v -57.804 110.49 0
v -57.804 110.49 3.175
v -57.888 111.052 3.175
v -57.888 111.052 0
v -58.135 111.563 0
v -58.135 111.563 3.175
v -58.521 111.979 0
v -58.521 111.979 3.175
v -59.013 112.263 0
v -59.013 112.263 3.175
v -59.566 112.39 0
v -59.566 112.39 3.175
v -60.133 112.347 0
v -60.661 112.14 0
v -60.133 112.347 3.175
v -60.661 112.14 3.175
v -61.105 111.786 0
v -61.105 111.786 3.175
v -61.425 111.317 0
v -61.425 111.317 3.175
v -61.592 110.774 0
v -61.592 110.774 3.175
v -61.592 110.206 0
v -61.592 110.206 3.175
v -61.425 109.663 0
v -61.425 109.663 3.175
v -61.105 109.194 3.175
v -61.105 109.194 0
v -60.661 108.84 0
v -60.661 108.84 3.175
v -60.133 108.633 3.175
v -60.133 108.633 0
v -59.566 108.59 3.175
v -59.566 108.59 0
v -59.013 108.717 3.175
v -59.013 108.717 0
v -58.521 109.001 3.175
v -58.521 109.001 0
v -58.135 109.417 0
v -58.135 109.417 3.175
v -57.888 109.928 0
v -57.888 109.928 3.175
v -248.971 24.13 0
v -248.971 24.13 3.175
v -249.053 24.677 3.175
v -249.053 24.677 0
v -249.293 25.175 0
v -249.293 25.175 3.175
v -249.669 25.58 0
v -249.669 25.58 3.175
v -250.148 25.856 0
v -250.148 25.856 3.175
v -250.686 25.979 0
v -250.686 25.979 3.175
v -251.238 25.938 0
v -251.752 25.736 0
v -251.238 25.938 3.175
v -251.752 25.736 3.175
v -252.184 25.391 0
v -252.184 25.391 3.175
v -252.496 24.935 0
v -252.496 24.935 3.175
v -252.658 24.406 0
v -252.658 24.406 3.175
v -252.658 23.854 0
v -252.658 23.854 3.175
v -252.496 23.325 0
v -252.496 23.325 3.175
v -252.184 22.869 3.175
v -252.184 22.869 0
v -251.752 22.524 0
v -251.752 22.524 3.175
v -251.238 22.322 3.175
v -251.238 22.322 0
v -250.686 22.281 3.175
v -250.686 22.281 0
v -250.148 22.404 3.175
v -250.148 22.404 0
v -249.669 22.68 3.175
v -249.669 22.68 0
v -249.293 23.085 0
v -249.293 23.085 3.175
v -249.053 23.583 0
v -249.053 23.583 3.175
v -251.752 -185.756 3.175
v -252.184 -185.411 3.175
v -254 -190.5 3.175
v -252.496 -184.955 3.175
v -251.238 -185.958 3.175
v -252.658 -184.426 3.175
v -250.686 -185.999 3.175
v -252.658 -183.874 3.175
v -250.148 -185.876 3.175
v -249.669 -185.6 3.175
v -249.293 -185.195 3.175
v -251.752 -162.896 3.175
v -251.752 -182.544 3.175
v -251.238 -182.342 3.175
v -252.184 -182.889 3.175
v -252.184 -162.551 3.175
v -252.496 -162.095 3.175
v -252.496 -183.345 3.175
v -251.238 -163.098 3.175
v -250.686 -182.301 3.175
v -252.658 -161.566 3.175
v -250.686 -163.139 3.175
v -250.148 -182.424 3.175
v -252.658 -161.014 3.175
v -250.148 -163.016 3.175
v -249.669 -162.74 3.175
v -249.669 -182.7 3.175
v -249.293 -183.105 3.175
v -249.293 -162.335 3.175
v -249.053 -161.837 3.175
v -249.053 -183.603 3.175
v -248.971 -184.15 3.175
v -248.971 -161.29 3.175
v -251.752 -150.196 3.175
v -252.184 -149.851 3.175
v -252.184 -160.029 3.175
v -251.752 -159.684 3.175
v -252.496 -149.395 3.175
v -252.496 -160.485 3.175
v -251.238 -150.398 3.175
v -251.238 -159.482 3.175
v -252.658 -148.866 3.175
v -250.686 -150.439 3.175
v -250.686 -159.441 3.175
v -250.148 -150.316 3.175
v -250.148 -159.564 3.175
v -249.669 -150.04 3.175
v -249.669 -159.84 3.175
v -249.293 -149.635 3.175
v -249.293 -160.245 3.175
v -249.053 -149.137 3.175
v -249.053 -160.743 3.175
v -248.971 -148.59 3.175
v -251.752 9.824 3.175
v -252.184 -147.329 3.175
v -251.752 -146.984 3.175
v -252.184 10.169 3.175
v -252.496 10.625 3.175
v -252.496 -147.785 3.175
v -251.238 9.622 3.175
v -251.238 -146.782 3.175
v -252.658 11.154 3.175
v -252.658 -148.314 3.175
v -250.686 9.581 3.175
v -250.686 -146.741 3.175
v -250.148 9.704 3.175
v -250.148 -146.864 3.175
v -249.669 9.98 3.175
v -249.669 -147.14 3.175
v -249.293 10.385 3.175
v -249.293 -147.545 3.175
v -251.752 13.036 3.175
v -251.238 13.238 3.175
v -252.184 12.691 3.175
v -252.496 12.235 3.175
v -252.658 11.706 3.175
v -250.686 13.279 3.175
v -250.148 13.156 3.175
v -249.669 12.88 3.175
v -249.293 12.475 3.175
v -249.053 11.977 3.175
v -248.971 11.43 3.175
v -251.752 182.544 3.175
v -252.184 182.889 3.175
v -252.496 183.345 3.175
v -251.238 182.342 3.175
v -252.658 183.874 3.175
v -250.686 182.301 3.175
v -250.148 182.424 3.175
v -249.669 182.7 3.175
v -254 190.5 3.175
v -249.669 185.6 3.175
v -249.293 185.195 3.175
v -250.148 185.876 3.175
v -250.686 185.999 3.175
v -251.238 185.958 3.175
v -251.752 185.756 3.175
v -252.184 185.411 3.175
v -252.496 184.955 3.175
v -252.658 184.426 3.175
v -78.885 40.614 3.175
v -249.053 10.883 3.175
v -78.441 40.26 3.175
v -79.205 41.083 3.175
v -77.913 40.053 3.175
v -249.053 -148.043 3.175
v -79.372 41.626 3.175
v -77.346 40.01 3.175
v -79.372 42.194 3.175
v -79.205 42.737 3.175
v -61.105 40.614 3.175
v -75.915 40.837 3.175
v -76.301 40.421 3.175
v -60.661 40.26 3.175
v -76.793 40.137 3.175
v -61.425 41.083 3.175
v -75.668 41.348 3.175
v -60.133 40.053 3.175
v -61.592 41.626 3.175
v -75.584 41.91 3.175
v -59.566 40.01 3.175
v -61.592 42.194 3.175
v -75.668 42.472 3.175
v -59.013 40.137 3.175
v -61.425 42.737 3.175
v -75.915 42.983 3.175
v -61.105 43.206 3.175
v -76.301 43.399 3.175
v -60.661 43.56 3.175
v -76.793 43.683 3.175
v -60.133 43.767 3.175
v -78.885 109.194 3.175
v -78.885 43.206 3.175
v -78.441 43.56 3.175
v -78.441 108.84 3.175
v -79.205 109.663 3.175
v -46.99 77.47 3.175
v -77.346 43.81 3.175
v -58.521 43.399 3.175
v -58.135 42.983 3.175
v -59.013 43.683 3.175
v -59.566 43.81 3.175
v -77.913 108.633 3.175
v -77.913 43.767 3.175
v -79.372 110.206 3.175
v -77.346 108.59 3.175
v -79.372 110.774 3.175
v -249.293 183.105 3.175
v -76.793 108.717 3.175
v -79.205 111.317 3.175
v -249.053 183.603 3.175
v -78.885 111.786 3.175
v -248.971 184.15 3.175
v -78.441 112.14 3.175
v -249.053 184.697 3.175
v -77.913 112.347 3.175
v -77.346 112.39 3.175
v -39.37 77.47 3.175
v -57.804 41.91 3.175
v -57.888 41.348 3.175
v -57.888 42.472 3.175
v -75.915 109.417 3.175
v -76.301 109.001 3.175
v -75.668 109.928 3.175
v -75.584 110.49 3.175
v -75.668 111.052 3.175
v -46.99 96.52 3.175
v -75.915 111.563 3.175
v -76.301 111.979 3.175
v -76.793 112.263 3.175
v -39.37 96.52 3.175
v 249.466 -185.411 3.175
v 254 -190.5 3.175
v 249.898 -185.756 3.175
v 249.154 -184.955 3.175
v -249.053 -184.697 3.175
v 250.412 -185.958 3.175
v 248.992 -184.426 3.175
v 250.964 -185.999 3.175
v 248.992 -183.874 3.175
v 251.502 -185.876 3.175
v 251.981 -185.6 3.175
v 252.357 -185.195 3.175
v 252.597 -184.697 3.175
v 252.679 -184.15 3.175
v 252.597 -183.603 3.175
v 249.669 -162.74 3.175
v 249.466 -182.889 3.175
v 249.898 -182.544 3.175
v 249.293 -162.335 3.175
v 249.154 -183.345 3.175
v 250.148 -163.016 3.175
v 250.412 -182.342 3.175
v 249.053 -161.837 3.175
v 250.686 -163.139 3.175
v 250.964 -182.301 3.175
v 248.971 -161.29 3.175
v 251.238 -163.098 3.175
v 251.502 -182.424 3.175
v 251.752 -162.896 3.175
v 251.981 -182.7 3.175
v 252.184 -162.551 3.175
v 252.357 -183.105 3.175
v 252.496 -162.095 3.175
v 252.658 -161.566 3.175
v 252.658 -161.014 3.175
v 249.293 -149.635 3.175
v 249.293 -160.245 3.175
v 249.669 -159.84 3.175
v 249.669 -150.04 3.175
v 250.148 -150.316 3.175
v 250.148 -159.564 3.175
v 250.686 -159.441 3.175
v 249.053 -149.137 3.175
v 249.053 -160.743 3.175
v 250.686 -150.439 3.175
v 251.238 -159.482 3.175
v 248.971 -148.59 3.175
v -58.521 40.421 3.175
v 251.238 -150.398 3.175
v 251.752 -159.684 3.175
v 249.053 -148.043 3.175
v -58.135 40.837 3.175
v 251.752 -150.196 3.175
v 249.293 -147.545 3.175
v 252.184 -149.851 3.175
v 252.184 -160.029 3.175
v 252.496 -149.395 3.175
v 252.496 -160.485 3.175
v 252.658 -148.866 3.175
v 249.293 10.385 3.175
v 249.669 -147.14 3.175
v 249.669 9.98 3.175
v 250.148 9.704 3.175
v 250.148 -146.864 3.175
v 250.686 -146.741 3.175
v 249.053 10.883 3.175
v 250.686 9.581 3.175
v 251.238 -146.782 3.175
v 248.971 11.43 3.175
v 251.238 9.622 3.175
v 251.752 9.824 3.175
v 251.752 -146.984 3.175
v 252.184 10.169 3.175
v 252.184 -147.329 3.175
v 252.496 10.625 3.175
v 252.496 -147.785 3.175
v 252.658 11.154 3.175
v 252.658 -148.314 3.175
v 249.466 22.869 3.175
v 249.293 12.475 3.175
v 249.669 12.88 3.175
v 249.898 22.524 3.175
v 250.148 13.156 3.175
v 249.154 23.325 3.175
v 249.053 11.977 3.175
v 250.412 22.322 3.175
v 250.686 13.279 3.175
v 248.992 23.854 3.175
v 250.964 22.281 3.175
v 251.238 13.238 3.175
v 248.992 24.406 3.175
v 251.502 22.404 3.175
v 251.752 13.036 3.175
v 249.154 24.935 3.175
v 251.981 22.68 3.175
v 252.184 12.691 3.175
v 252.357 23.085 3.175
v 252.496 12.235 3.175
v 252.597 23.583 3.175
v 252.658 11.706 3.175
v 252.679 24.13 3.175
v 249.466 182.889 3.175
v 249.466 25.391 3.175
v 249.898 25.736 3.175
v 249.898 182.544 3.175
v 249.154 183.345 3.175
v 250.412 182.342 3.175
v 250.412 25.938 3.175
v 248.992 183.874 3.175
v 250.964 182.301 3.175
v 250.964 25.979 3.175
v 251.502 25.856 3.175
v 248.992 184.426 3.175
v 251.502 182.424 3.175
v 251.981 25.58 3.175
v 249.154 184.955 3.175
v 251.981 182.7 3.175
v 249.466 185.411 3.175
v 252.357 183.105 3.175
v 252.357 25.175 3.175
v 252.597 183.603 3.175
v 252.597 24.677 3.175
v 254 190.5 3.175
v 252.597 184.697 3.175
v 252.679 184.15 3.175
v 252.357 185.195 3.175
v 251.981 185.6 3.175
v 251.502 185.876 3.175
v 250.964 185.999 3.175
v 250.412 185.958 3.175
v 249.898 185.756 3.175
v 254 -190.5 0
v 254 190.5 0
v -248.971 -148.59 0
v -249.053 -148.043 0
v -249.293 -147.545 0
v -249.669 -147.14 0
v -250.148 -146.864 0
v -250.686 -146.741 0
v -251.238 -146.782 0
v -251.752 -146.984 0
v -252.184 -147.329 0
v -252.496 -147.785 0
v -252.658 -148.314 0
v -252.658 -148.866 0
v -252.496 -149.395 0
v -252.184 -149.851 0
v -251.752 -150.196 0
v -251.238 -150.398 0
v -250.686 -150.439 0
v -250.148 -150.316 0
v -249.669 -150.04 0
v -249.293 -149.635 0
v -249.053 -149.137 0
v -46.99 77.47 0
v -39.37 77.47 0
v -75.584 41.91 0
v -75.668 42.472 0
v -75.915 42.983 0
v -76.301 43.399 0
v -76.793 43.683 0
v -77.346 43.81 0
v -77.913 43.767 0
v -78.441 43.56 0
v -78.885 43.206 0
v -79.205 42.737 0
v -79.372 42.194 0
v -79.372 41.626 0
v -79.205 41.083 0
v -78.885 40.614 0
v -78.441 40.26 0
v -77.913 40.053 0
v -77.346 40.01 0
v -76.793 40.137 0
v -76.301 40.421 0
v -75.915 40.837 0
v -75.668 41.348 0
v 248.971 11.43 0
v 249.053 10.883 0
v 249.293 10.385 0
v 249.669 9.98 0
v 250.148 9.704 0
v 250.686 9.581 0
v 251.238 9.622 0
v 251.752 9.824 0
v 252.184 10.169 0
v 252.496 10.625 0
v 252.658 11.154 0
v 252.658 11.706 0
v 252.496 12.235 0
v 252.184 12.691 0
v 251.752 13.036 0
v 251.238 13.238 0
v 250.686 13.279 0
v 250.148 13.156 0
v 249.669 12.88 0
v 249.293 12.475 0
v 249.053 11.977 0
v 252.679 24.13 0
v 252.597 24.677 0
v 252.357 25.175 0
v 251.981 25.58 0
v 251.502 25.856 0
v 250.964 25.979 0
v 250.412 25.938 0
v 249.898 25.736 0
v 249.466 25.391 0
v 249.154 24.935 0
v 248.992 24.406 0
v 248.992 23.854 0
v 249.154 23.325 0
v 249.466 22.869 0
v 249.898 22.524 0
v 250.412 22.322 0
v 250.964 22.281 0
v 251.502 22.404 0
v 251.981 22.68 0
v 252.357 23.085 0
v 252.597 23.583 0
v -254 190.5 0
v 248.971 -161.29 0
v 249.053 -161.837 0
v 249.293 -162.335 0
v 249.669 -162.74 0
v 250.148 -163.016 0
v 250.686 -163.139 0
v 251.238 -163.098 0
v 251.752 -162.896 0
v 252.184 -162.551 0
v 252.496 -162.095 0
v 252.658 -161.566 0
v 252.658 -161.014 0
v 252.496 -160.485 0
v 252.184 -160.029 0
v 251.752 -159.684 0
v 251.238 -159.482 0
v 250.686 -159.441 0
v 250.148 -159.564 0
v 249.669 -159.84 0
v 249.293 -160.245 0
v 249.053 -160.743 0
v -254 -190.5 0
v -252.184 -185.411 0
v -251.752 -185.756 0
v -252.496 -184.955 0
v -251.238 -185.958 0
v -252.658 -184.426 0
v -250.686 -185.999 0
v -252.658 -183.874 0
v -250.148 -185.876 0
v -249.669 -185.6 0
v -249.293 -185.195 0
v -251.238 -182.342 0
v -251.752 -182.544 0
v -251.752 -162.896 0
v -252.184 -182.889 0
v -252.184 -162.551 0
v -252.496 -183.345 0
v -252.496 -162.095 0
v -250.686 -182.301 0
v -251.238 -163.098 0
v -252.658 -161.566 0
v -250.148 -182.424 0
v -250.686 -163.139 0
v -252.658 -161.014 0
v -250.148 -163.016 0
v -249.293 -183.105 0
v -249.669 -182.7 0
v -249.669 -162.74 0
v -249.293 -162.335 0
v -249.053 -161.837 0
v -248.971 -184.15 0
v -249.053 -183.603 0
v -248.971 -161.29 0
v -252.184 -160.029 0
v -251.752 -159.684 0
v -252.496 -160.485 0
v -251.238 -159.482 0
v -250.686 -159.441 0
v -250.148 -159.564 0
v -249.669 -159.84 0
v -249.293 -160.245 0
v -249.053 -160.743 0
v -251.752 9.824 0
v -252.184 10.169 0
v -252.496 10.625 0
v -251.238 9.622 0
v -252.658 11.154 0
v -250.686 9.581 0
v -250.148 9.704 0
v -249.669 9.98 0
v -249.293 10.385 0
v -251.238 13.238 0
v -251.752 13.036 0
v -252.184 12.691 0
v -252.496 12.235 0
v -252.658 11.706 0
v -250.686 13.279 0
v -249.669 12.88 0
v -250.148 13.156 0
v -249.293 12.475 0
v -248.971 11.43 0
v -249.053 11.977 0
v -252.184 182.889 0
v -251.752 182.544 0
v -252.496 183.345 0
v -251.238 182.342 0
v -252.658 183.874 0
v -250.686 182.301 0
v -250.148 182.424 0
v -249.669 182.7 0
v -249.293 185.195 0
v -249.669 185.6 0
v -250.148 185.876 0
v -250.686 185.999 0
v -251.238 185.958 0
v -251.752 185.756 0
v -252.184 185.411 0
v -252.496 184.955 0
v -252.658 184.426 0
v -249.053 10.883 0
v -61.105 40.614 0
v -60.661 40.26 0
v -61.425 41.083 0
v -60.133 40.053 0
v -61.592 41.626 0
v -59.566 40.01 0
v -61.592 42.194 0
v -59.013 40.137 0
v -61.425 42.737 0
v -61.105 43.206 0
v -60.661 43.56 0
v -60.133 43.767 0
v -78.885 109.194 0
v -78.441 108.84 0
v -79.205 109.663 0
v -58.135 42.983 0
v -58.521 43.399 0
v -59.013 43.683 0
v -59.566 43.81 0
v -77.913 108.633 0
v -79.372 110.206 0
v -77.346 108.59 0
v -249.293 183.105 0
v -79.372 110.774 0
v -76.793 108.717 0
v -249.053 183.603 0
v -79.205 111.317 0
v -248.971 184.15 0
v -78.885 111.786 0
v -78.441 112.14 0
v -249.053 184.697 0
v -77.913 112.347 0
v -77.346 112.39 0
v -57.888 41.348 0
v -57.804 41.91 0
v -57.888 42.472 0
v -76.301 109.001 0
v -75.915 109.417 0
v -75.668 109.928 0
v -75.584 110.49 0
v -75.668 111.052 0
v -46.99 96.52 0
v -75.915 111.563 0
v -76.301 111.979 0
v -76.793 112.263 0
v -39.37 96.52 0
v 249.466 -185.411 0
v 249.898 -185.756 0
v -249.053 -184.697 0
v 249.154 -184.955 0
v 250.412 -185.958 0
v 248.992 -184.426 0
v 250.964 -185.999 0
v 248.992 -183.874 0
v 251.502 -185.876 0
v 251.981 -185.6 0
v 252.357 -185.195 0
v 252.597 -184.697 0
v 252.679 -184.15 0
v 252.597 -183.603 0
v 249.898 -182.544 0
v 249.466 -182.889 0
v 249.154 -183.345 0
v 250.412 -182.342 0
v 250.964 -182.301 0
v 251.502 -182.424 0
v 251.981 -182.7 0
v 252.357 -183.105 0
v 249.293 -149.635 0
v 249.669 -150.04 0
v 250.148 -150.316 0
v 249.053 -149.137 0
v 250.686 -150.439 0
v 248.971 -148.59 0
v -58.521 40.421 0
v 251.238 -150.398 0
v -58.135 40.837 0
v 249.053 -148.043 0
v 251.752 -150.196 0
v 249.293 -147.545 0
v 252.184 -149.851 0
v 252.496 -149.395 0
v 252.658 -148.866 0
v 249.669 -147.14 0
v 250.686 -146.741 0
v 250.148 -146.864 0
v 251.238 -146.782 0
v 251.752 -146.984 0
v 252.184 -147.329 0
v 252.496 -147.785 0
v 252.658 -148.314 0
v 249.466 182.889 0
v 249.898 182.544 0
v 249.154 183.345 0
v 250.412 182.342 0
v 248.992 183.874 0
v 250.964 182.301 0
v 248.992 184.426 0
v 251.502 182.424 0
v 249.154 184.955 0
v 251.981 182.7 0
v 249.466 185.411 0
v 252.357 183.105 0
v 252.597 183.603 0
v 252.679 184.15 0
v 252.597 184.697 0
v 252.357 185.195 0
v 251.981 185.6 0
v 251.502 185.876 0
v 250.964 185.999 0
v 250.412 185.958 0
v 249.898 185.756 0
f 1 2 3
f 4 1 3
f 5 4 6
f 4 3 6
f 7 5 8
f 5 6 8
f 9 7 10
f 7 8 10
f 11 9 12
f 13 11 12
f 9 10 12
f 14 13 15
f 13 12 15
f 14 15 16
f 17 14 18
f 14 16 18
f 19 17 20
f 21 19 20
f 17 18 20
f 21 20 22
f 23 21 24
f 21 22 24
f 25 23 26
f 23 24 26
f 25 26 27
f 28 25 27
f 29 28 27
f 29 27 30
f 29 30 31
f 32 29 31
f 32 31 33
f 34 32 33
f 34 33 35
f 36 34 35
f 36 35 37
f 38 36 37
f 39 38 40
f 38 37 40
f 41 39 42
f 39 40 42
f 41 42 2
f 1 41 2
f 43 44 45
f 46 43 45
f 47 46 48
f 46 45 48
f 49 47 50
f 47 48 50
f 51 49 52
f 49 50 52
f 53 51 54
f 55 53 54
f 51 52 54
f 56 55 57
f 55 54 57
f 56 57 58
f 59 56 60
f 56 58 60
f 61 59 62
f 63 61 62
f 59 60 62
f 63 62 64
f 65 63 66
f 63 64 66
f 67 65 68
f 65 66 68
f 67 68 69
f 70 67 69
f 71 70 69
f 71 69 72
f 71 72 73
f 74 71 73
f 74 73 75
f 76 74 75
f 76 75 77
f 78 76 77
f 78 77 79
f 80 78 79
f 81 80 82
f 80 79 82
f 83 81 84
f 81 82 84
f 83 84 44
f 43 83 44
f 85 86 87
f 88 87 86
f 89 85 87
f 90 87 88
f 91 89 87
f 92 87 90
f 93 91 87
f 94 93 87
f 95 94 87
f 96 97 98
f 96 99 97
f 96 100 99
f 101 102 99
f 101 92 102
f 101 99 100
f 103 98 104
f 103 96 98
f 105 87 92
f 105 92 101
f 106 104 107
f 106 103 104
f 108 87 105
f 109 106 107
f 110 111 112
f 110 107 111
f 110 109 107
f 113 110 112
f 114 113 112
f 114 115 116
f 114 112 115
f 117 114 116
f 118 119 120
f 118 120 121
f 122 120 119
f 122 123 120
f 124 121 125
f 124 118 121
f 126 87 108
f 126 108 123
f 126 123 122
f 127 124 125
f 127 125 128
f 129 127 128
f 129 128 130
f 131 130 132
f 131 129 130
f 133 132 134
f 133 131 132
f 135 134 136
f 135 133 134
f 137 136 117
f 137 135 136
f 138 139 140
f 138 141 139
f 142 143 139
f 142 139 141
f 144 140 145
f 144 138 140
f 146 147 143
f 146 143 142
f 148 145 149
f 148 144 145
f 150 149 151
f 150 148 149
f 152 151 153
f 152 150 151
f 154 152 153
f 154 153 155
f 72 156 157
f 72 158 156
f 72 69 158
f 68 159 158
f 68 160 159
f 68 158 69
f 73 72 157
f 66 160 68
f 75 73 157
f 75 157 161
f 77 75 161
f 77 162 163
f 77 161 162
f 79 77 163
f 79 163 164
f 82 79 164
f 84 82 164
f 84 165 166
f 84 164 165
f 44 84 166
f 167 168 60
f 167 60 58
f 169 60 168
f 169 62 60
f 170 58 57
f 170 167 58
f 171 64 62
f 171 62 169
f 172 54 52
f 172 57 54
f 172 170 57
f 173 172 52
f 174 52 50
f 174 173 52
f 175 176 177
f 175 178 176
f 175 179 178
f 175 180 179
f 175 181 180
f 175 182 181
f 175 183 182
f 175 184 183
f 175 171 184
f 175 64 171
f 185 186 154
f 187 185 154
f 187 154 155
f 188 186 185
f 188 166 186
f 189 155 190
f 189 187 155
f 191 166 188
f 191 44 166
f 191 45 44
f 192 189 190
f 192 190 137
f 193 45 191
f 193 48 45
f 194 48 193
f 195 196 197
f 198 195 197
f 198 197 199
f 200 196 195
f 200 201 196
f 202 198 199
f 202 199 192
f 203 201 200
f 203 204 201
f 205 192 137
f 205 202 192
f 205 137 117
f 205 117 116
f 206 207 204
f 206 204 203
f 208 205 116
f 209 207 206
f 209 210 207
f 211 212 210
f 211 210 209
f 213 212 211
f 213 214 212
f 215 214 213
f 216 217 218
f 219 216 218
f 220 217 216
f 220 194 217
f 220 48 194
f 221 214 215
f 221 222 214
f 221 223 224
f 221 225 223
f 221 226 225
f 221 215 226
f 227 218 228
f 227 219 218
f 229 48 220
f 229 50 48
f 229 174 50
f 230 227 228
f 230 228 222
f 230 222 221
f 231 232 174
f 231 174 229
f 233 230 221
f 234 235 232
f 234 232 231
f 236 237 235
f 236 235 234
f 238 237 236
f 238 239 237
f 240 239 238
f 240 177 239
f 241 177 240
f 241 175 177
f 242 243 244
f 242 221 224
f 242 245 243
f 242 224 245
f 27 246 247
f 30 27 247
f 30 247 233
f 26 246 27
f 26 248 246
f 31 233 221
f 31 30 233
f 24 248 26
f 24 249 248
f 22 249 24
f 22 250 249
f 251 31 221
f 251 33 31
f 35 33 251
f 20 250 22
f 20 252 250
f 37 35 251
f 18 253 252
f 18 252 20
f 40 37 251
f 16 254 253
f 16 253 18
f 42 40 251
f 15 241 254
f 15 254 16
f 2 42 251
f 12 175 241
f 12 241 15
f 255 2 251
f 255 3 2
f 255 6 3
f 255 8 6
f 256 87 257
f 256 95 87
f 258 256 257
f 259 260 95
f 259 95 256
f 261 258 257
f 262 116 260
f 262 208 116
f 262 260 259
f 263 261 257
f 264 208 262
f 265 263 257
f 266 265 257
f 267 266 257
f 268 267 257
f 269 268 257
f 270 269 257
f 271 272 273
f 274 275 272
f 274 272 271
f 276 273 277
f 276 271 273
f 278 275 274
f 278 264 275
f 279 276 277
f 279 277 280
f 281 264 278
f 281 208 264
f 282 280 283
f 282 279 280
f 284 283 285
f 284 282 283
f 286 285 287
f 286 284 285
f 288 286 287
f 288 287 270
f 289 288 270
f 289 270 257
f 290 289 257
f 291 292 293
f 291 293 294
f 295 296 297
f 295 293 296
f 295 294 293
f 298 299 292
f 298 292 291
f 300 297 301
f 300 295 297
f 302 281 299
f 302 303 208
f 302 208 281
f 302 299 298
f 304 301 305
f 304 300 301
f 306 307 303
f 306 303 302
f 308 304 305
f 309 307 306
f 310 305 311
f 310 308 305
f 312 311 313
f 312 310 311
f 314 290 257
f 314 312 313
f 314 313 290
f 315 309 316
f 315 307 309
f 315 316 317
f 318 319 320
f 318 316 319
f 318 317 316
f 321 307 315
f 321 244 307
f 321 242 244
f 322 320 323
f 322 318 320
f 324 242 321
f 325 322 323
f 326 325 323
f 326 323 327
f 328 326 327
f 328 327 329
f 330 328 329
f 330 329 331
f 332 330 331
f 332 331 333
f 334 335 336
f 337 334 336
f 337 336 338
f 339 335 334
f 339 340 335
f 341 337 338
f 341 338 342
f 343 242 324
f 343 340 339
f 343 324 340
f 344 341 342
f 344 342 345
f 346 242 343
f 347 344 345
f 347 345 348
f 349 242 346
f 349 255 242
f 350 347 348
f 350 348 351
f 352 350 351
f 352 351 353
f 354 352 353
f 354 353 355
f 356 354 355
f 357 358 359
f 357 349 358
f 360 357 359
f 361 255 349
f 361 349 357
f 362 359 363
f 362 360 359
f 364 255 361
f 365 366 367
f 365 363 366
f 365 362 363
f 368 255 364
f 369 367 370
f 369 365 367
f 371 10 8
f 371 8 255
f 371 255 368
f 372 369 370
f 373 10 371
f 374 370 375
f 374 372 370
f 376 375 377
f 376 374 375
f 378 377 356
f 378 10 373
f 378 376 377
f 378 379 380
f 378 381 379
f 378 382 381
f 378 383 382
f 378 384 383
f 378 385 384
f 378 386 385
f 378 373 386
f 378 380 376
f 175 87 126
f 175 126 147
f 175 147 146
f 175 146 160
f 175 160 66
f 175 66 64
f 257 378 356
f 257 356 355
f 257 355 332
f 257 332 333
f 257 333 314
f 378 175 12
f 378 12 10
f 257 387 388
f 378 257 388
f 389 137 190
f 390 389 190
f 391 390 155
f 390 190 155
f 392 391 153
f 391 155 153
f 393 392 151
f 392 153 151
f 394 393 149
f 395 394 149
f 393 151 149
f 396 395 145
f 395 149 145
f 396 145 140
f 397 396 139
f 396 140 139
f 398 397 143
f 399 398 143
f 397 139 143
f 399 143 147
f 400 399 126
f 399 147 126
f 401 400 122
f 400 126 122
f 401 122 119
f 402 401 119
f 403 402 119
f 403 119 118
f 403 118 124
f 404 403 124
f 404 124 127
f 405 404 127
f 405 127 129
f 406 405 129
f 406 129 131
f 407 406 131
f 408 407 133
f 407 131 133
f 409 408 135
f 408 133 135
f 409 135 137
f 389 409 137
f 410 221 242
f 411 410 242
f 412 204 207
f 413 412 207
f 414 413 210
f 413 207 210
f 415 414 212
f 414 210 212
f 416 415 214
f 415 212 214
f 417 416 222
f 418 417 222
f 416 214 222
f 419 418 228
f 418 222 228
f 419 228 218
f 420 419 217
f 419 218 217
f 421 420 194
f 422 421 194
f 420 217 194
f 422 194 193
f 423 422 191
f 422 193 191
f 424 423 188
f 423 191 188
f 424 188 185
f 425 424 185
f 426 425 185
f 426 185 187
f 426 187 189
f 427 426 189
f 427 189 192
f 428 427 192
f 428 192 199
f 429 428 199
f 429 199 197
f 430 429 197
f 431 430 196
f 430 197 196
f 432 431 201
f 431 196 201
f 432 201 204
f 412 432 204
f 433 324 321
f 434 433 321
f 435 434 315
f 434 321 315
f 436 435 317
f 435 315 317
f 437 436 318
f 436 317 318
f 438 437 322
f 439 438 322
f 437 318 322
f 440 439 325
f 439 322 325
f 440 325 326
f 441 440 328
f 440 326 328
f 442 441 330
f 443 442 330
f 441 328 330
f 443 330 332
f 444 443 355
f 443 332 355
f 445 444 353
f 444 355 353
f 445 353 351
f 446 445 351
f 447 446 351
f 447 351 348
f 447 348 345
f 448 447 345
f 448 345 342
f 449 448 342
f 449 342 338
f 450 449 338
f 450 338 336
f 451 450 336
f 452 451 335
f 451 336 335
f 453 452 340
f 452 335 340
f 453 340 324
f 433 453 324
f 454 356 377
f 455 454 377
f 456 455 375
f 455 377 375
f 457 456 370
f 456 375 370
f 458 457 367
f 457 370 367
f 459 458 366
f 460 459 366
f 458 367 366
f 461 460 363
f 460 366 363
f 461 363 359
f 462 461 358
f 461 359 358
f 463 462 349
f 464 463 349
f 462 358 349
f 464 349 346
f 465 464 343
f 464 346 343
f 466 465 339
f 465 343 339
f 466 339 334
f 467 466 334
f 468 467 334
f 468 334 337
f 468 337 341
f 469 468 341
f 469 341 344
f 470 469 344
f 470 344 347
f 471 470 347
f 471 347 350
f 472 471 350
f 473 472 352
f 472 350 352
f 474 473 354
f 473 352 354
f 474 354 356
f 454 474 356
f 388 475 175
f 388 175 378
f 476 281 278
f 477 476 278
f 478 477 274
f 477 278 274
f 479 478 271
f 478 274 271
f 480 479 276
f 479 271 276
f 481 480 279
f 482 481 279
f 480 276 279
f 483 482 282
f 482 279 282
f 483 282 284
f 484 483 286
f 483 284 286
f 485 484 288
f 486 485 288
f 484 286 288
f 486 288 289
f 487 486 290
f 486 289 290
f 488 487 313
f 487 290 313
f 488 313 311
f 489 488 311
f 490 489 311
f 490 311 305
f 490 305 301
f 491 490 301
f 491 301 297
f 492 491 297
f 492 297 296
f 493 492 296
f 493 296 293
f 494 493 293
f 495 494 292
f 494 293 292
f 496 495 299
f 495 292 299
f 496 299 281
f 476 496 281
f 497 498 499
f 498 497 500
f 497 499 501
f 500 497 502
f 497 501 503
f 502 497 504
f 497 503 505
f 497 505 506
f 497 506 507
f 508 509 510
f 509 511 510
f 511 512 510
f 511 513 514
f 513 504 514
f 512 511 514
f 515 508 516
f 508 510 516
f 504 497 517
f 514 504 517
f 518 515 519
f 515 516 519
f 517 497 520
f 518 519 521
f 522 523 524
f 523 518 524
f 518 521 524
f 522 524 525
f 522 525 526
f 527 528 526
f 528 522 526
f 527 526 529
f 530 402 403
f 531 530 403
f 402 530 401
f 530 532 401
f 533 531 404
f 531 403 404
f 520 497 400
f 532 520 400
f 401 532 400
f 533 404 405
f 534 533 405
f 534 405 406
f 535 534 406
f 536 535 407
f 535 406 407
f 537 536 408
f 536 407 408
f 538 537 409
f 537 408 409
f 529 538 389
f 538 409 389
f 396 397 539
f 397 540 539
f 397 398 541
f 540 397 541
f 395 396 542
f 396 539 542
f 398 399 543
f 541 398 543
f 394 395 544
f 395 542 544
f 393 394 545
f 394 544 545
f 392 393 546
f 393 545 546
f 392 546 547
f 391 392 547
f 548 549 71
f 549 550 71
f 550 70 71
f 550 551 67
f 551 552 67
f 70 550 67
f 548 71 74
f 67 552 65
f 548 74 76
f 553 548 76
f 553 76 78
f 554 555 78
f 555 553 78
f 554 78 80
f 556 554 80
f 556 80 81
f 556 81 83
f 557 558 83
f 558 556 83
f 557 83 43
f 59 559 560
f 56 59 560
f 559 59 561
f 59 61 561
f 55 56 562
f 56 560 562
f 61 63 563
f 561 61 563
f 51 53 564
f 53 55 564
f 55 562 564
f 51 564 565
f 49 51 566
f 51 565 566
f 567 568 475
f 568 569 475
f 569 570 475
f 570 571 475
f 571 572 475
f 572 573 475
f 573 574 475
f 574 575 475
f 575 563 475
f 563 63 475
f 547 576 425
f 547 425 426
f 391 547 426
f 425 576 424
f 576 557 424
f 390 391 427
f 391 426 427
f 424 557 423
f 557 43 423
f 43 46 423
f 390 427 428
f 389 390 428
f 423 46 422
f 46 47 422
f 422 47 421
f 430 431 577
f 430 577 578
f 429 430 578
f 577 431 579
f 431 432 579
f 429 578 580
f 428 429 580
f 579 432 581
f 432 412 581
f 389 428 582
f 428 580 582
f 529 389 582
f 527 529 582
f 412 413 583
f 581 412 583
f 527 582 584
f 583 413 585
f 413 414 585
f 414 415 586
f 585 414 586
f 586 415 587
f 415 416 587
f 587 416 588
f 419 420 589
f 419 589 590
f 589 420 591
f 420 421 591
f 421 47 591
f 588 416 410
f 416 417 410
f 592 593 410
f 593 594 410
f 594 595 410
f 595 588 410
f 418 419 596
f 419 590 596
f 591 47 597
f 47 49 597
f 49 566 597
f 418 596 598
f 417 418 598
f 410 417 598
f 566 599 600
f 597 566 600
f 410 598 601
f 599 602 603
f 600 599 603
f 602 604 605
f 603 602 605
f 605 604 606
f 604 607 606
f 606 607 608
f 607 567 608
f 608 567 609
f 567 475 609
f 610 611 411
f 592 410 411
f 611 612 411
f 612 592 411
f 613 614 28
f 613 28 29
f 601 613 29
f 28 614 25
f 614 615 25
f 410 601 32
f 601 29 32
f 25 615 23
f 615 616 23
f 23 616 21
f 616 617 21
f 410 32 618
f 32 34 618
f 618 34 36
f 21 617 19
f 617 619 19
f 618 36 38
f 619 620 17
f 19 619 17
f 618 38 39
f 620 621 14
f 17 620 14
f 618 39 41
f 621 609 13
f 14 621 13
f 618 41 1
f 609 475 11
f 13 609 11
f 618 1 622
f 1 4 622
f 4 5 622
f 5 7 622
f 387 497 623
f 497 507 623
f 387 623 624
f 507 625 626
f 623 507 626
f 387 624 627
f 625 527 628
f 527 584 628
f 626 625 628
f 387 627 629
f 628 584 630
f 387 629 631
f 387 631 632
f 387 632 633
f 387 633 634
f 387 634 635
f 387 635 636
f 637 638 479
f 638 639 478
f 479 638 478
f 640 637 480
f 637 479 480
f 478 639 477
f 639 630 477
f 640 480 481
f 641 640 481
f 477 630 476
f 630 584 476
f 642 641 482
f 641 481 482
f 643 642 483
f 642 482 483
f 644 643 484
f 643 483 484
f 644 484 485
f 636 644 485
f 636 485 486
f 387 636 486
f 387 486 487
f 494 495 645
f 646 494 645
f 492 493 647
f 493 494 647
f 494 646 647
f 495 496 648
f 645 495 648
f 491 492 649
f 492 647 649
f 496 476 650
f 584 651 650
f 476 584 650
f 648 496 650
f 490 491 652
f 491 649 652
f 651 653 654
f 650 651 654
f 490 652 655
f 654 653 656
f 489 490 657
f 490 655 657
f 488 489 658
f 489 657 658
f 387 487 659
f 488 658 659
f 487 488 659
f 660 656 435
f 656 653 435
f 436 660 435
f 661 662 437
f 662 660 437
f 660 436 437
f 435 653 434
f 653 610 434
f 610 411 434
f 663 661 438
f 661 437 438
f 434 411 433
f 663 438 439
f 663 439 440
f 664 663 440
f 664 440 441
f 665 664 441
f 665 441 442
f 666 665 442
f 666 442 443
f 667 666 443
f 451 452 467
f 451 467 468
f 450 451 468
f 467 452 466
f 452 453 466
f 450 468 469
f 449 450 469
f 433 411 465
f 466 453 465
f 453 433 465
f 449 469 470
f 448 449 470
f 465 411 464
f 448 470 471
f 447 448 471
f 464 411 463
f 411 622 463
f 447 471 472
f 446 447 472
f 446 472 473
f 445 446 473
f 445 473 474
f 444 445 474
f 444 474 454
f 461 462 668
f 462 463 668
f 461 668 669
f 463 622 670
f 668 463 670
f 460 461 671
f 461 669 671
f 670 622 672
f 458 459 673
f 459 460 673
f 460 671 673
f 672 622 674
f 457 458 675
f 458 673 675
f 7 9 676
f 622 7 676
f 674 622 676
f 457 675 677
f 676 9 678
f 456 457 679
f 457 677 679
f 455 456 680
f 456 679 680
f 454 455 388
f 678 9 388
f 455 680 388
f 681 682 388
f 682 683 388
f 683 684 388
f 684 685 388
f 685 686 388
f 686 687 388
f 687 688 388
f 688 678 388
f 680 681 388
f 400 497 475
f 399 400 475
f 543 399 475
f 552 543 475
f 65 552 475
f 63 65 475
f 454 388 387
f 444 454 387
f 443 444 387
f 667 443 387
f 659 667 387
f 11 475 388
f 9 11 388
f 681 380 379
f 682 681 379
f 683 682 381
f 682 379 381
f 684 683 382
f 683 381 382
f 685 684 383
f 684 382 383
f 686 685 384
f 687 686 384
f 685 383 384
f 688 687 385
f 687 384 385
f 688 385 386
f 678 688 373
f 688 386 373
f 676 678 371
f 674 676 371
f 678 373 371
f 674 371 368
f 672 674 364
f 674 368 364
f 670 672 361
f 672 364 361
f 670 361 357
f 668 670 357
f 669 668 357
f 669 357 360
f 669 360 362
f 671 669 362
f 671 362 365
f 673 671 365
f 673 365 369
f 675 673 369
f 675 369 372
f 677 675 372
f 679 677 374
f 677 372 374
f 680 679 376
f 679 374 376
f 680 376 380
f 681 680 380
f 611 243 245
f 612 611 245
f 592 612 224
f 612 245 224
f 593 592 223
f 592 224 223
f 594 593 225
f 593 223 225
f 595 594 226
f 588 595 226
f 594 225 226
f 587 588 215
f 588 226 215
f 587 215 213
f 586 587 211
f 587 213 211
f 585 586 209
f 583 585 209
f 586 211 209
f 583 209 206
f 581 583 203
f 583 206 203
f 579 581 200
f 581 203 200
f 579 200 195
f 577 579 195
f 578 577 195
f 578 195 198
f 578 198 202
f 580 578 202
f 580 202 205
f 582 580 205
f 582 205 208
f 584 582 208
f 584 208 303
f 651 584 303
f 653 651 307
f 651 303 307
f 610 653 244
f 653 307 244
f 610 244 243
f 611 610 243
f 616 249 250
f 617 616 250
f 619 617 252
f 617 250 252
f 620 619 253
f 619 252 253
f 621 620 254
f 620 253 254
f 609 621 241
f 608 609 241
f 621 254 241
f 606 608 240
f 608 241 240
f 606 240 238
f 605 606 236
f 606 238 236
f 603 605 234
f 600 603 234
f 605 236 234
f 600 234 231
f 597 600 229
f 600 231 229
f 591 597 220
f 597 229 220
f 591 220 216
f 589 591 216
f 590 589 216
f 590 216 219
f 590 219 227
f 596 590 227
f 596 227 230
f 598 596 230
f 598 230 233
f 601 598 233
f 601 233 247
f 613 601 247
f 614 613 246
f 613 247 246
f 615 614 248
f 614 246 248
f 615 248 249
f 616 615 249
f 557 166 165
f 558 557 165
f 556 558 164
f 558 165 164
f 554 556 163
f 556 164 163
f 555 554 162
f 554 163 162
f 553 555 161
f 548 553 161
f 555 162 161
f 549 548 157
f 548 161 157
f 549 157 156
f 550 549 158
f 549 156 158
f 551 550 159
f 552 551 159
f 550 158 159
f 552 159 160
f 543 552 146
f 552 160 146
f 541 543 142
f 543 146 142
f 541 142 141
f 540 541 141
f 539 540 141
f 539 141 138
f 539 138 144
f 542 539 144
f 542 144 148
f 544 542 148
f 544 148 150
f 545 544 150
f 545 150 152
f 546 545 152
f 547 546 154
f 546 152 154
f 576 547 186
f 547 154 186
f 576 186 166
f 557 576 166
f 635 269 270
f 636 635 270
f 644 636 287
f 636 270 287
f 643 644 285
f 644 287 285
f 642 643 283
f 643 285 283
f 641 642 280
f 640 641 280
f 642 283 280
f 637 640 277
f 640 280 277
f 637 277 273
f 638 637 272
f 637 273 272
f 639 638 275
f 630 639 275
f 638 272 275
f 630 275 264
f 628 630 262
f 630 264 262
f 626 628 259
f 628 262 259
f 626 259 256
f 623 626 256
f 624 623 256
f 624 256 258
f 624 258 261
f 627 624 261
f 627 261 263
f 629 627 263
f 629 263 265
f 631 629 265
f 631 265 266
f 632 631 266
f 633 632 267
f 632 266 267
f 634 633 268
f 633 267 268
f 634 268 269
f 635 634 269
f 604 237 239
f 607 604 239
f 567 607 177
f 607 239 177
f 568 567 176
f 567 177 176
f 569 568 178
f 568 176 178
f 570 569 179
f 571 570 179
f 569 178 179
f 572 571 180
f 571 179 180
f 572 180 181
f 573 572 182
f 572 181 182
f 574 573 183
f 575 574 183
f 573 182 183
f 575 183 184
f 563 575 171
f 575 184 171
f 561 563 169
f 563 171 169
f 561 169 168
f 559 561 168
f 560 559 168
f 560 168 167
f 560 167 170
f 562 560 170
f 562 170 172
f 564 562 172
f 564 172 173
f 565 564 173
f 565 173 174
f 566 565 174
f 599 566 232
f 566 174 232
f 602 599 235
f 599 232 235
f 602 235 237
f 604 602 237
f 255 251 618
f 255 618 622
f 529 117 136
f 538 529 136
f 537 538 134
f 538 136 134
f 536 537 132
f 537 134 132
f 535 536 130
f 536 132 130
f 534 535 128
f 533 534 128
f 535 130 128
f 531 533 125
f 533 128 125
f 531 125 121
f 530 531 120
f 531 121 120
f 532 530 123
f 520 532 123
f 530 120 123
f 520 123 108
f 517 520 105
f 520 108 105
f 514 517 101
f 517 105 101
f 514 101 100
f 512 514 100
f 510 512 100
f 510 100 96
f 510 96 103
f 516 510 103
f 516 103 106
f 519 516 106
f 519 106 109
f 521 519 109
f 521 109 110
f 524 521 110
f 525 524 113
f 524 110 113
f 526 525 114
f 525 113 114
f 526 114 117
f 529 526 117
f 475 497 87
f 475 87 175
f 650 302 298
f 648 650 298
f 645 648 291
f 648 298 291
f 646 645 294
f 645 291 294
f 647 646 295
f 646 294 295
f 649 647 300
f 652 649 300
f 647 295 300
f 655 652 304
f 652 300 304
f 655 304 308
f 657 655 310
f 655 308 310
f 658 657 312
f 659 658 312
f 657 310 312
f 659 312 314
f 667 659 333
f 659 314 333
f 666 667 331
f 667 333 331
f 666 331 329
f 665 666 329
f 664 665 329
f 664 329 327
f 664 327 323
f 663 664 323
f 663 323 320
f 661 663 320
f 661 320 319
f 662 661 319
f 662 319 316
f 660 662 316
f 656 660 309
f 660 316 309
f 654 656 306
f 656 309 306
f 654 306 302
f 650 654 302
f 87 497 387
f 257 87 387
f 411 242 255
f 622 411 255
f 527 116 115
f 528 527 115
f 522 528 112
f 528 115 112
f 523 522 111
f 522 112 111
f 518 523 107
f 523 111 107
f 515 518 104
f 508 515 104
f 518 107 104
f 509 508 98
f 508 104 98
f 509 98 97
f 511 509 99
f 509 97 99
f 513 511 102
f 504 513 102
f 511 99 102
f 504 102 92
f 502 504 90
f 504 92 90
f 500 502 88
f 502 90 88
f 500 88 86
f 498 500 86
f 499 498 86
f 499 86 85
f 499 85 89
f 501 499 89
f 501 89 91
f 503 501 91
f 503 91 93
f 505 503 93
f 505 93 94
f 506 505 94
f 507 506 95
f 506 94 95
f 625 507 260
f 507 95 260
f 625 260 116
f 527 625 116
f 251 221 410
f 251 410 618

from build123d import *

# Parameters (mm, degrees)
SKETCH1_W           = 508
SKETCH1_H           = 381
BOSS_EXTRUDE1_DEPTH = 3.175
SKETCH3_W           = 7.62
SKETCH3_H           = 19.05
CUT_EXTRUDE2_DEPTH  = 3.175
SKETCH2_R           = 1.8542
SKETCH2_R_2         = 1.905
CUT_EXTRUDE1_DEPTH  = 3.175


with BuildPart() as part:
    # Sketch1 → Boss-Extrude1 (new body)
    with BuildSketch(Plane.XY):
        Rectangle(SKETCH1_W, SKETCH1_H)
    extrude(amount=BOSS_EXTRUDE1_DEPTH)

    # Sketch3 → Cut-Extrude2 (cut)
    with BuildSketch(Plane.XY.offset(3.175)):
        with Locations((-43.18, 86.995)):
            Rectangle(SKETCH3_W, SKETCH3_H)
    extrude(amount=-CUT_EXTRUDE2_DEPTH, mode=Mode.SUBTRACT)

    # Sketch2 → Cut-Extrude1 (cut)
    with BuildSketch(Plane.XY.offset(3.175)):
        with Locations((-250.825, -184.15)):
            Circle(SKETCH2_R)
        with Locations((-250.825, 184.15)):
            Circle(SKETCH2_R)
        with Locations((250.825, 184.15)):
            Circle(SKETCH2_R)
        with Locations((250.825, -184.15)):
            Circle(SKETCH2_R)
        with Locations((-250.825, 24.13)):
            Circle(SKETCH2_R)
        with Locations((250.825, 24.13)):
            Circle(SKETCH2_R)
        with Locations((-250.825, 11.43)):
            Circle(SKETCH2_R)
        with Locations((-250.825, -148.59)):
            Circle(SKETCH2_R)
        with Locations((-250.825, -161.29)):
            Circle(SKETCH2_R)
        with Locations(Location((250.825, -161.29, 0), (0, 0, 180))):
            Circle(SKETCH2_R)
        with Locations(Location((250.825, -148.59, 0), (0, 0, 180))):
            Circle(SKETCH2_R)
        with Locations(Location((250.825, 11.43, 0), (0, 0, 180))):
            Circle(SKETCH2_R)
        with Locations((-77.488669, 110.49)):
            Circle(SKETCH2_R_2)
        with Locations((-77.488669, 41.91)):
            Circle(SKETCH2_R_2)
        with Locations((-59.708669, 110.49)):
            Circle(SKETCH2_R_2)
        with Locations((-59.708669, 41.91)):
            Circle(SKETCH2_R_2)
    extrude(amount=-CUT_EXTRUDE1_DEPTH, mode=Mode.SUBTRACT)


solid = part.part
